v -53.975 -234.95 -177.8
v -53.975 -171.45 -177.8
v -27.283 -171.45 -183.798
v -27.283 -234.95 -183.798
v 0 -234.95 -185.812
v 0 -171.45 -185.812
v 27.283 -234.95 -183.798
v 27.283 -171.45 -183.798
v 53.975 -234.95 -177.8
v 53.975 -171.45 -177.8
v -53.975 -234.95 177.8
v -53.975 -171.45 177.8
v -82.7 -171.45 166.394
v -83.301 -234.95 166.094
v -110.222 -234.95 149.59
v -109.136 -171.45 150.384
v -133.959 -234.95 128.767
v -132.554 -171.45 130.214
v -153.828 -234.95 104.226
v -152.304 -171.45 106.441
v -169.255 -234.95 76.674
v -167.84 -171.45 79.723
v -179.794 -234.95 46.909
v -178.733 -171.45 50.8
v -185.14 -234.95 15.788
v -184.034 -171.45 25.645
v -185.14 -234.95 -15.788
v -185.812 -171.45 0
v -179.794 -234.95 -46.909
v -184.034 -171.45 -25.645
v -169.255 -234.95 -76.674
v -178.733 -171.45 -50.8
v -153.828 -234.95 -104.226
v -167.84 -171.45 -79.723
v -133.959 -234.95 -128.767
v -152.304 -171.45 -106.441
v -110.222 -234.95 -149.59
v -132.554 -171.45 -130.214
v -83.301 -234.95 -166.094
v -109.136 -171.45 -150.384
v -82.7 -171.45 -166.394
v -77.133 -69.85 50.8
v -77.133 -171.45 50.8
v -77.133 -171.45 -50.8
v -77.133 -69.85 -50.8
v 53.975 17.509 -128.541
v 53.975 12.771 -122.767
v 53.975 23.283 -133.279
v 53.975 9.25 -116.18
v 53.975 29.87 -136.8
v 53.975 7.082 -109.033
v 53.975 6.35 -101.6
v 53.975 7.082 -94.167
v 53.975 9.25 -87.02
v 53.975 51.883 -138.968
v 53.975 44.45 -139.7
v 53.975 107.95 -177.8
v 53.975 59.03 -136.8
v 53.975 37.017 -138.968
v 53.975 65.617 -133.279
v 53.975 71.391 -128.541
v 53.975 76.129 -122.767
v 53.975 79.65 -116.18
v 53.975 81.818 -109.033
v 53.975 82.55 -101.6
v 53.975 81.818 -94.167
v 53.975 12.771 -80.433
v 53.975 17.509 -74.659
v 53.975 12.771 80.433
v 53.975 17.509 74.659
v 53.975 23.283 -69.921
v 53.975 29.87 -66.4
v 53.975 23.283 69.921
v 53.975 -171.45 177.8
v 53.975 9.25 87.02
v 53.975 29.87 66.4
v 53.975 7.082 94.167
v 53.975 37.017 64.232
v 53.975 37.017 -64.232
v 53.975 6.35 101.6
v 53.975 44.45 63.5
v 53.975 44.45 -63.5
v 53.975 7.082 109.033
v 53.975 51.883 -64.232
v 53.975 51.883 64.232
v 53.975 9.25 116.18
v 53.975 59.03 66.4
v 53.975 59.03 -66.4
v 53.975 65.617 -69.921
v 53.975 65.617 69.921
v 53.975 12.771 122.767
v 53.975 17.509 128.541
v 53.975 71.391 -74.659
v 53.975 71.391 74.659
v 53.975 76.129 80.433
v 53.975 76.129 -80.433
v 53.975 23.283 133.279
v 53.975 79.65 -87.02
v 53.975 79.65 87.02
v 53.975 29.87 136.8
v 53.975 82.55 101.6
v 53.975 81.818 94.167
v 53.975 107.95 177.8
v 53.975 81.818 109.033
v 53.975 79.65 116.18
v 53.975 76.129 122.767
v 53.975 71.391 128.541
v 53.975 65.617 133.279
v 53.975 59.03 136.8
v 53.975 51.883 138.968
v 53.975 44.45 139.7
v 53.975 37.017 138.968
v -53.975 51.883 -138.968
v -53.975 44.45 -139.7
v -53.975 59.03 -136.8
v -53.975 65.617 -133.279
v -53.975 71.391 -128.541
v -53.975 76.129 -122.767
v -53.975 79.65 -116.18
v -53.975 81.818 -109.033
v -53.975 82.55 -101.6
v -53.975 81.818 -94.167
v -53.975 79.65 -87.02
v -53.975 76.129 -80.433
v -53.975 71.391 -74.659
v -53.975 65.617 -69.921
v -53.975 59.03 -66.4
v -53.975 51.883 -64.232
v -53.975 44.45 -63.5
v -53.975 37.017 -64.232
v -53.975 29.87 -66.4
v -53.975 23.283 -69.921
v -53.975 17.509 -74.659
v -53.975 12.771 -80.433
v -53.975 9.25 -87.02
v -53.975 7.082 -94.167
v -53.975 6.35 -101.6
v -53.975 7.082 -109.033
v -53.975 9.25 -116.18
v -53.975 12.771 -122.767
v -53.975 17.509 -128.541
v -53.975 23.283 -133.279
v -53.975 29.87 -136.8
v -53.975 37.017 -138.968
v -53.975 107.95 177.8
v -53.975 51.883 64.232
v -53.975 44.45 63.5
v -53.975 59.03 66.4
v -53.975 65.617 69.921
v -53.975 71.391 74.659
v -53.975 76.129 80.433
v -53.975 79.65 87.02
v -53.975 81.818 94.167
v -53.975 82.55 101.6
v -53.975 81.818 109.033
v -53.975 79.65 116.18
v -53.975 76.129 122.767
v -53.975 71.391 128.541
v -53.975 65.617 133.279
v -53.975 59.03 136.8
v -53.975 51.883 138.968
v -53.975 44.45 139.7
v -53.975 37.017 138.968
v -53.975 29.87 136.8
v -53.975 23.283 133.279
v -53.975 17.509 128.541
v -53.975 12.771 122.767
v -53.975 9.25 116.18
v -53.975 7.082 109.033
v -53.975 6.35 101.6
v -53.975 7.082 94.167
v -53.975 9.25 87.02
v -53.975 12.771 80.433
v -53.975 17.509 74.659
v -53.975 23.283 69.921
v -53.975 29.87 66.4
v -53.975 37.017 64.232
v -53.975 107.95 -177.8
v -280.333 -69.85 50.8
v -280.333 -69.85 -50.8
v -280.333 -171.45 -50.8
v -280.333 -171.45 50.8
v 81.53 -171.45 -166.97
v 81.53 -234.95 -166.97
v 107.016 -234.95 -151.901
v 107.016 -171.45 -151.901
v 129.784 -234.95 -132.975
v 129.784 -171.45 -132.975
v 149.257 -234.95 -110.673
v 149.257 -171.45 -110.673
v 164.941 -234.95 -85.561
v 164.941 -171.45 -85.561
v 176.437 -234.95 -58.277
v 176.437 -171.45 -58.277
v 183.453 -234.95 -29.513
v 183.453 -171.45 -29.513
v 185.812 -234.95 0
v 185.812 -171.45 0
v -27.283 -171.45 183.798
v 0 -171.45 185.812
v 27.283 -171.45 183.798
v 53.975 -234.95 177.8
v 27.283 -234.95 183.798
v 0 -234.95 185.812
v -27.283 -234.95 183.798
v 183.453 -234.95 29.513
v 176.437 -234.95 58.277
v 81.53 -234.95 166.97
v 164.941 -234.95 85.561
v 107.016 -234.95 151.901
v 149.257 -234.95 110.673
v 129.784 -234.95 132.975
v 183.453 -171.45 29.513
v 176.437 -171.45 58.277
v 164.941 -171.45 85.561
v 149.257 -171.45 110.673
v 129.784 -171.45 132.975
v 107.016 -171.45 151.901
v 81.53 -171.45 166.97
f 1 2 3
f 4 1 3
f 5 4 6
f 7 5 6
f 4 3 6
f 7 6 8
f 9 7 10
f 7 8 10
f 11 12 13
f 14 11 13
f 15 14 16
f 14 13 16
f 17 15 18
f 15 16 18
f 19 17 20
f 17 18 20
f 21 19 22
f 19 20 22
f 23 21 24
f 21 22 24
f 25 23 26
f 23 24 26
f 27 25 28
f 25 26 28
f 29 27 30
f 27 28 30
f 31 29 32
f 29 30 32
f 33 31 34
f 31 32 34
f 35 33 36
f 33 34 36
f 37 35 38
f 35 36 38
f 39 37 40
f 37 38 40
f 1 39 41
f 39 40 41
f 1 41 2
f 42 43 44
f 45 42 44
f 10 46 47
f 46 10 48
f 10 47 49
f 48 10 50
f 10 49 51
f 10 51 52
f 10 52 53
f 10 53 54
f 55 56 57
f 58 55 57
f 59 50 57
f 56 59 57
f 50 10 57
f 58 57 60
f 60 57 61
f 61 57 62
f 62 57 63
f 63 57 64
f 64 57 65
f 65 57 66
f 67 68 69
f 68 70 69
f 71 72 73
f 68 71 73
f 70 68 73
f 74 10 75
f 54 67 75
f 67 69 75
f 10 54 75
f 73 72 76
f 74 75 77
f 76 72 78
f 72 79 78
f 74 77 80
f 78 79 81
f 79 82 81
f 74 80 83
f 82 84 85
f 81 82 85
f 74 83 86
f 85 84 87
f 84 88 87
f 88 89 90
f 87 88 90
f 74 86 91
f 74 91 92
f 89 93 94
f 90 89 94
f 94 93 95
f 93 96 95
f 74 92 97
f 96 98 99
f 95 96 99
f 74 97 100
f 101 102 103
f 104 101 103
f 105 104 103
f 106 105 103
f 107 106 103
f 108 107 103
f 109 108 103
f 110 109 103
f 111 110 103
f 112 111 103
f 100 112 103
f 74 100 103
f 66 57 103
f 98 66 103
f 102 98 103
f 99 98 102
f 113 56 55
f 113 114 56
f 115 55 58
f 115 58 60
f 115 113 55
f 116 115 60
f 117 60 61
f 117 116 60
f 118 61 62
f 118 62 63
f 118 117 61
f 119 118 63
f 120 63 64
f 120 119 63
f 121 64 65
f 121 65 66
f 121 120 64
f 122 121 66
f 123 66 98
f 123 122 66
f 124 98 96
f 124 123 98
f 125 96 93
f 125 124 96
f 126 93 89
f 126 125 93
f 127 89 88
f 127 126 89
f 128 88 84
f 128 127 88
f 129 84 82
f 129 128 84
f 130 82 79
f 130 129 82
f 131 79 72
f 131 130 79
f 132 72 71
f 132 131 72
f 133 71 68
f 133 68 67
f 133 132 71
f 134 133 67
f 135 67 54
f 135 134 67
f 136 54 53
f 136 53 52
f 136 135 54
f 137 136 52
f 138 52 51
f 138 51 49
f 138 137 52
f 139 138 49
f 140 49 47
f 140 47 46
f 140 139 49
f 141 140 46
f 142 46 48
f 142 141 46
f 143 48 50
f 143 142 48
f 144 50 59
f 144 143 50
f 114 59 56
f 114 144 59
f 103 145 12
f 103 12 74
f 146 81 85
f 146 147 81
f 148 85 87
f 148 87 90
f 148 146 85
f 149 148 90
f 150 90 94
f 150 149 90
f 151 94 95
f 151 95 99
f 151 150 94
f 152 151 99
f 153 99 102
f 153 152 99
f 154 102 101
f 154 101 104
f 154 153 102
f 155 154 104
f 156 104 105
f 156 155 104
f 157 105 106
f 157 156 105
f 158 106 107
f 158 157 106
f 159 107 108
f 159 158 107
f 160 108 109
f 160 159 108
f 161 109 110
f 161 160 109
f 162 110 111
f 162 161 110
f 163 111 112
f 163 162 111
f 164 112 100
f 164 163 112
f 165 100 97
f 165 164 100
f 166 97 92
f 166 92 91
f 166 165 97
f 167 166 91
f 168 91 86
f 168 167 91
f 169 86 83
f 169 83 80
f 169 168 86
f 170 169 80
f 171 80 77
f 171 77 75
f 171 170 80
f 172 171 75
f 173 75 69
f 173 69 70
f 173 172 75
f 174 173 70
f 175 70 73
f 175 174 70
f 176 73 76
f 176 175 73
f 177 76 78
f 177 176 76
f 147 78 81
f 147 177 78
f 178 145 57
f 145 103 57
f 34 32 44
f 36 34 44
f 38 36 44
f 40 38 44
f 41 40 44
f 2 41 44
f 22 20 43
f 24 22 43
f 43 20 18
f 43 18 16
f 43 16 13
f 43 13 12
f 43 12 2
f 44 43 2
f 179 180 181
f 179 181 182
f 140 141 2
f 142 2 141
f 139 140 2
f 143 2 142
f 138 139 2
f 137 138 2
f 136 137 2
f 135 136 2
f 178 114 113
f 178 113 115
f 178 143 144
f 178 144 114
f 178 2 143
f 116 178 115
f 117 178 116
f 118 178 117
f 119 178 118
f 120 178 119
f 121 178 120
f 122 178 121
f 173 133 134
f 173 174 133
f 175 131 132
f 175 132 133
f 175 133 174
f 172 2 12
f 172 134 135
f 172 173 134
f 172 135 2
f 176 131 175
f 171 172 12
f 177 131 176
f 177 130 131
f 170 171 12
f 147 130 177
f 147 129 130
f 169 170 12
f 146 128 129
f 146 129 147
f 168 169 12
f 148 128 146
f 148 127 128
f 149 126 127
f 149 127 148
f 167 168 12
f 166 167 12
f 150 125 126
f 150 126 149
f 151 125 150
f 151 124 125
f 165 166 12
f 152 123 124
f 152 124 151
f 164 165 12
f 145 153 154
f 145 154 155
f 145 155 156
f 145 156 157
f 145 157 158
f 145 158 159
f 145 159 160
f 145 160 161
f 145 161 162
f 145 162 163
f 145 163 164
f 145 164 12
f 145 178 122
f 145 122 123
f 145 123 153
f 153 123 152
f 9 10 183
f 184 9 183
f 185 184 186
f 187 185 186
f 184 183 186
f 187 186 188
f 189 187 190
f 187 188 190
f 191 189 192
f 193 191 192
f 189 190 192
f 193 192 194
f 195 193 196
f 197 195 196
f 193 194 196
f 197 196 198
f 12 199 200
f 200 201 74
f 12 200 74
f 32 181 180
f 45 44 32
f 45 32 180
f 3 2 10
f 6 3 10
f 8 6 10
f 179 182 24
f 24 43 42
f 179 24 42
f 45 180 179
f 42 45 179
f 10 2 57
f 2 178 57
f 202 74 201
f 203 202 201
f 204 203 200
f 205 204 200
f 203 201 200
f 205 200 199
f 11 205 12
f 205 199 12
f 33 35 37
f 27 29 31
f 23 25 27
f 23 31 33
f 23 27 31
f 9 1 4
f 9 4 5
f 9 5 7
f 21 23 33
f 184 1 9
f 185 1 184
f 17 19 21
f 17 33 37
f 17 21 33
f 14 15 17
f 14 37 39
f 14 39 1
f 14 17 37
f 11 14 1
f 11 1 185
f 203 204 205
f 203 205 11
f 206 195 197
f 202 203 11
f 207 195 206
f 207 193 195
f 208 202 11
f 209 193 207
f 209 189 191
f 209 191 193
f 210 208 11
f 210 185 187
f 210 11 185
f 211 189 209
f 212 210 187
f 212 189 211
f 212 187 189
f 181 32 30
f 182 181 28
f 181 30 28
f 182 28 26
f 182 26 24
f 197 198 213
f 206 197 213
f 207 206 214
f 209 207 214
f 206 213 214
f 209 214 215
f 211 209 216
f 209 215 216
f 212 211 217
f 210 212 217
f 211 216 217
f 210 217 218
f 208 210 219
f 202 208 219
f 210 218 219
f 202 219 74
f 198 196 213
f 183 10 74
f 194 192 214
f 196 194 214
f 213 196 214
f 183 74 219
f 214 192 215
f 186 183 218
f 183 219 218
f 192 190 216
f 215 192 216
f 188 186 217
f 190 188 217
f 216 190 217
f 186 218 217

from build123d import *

# Parameters (mm, degrees)
SKETCH1_W           = 355.6
SKETCH1_H           = 215.9
SKETCH1_R           = 38.1
BOSS_EXTRUDE1_DEPTH = 53.975
SKETCH4_W           = 107.95
SKETCH4_H           = 355.6
BOSS_EXTRUDE4_DEPTH = 63.5
SKETCH2_W           = 107.95
SKETCH2_H           = 355.6
BOSS_EXTRUDE5_DEPTH = 63.5
SKETCH3_W           = 101.6
SKETCH3_H           = 101.6
BOSS_EXTRUDE3_DEPTH = 101.6
SKETCH5_W           = 101.6
SKETCH5_H           = 101.6
BOSS_EXTRUDE6_DEPTH = 101.6


with BuildPart() as part:
    # Sketch1 → Boss-Extrude1 (new, symmetric)
    with BuildSketch(Plane(origin=(0, 0, 0), x_dir=(0, 0, -1), z_dir=(1, 0, 0))):
        Rectangle(SKETCH1_W, SKETCH1_H)
        with Locations((-101.6, 44.45)):
            Circle(SKETCH1_R, mode=Mode.SUBTRACT)
        with Locations((101.6, 44.45)):
            Circle(SKETCH1_R, mode=Mode.SUBTRACT)
    extrude(amount=BOSS_EXTRUDE1_DEPTH, both=True)

    # Sketch4 → Boss-Extrude4 (add)
    with BuildSketch(Plane.XZ.offset(107.95)):
        Rectangle(SKETCH4_W, SKETCH4_H)
    extrude(amount=BOSS_EXTRUDE4_DEPTH)

    # Sketch2 → Boss-Extrude5 (add)
    with BuildSketch(Plane.XZ.offset(171.45)):
        with BuildLine():
            Line((-53.975, -177.8), (-53.975, 177.8))
            ThreePointArc((-53.975, 177.8), (-185.812111083, 0), (-53.975, -177.8))
        make_face()
        Rectangle(SKETCH2_W, SKETCH2_H)
        with BuildLine():
            ThreePointArc((185.812111083, 0), (149.257075746, 110.672787824), (53.975, 177.8))
            Line((53.975, 177.8), (53.975, -177.8))
            ThreePointArc((53.975, -177.8), (149.257075746, -110.672787824), (185.812111083, 0))
        make_face()
        with BuildLine():
            ThreePointArc((-53.975, -177.8), (0, -185.812111083), (53.975, -177.8))
            Line((53.975, -177.8), (-53.975, -177.8))
        make_face()
        with BuildLine():
            Line((-53.975, 177.8), (53.975, 177.8))
            ThreePointArc((53.975, 177.8), (0, 185.812111083), (-53.975, 177.8))
        make_face()
    extrude(amount=BOSS_EXTRUDE5_DEPTH)

    # Sketch3 → Boss-Extrude3 (add)
    with BuildSketch(Plane(origin=(0, -171.45, 0), x_dir=(1, 0, 0), z_dir=(0, 1, 0))):
        with Locations((-127.933042902, 0)):
            Rectangle(SKETCH3_W, SKETCH3_H)
    extrude(amount=BOSS_EXTRUDE3_DEPTH)

    # Sketch5 → Boss-Extrude6 (add)
    with BuildSketch(Plane.ZY.offset(178.733042902)):
        with Locations((0, -120.65)):
            Rectangle(SKETCH5_W, SKETCH5_H)
    extrude(amount=BOSS_EXTRUDE6_DEPTH)


solid = part.part
